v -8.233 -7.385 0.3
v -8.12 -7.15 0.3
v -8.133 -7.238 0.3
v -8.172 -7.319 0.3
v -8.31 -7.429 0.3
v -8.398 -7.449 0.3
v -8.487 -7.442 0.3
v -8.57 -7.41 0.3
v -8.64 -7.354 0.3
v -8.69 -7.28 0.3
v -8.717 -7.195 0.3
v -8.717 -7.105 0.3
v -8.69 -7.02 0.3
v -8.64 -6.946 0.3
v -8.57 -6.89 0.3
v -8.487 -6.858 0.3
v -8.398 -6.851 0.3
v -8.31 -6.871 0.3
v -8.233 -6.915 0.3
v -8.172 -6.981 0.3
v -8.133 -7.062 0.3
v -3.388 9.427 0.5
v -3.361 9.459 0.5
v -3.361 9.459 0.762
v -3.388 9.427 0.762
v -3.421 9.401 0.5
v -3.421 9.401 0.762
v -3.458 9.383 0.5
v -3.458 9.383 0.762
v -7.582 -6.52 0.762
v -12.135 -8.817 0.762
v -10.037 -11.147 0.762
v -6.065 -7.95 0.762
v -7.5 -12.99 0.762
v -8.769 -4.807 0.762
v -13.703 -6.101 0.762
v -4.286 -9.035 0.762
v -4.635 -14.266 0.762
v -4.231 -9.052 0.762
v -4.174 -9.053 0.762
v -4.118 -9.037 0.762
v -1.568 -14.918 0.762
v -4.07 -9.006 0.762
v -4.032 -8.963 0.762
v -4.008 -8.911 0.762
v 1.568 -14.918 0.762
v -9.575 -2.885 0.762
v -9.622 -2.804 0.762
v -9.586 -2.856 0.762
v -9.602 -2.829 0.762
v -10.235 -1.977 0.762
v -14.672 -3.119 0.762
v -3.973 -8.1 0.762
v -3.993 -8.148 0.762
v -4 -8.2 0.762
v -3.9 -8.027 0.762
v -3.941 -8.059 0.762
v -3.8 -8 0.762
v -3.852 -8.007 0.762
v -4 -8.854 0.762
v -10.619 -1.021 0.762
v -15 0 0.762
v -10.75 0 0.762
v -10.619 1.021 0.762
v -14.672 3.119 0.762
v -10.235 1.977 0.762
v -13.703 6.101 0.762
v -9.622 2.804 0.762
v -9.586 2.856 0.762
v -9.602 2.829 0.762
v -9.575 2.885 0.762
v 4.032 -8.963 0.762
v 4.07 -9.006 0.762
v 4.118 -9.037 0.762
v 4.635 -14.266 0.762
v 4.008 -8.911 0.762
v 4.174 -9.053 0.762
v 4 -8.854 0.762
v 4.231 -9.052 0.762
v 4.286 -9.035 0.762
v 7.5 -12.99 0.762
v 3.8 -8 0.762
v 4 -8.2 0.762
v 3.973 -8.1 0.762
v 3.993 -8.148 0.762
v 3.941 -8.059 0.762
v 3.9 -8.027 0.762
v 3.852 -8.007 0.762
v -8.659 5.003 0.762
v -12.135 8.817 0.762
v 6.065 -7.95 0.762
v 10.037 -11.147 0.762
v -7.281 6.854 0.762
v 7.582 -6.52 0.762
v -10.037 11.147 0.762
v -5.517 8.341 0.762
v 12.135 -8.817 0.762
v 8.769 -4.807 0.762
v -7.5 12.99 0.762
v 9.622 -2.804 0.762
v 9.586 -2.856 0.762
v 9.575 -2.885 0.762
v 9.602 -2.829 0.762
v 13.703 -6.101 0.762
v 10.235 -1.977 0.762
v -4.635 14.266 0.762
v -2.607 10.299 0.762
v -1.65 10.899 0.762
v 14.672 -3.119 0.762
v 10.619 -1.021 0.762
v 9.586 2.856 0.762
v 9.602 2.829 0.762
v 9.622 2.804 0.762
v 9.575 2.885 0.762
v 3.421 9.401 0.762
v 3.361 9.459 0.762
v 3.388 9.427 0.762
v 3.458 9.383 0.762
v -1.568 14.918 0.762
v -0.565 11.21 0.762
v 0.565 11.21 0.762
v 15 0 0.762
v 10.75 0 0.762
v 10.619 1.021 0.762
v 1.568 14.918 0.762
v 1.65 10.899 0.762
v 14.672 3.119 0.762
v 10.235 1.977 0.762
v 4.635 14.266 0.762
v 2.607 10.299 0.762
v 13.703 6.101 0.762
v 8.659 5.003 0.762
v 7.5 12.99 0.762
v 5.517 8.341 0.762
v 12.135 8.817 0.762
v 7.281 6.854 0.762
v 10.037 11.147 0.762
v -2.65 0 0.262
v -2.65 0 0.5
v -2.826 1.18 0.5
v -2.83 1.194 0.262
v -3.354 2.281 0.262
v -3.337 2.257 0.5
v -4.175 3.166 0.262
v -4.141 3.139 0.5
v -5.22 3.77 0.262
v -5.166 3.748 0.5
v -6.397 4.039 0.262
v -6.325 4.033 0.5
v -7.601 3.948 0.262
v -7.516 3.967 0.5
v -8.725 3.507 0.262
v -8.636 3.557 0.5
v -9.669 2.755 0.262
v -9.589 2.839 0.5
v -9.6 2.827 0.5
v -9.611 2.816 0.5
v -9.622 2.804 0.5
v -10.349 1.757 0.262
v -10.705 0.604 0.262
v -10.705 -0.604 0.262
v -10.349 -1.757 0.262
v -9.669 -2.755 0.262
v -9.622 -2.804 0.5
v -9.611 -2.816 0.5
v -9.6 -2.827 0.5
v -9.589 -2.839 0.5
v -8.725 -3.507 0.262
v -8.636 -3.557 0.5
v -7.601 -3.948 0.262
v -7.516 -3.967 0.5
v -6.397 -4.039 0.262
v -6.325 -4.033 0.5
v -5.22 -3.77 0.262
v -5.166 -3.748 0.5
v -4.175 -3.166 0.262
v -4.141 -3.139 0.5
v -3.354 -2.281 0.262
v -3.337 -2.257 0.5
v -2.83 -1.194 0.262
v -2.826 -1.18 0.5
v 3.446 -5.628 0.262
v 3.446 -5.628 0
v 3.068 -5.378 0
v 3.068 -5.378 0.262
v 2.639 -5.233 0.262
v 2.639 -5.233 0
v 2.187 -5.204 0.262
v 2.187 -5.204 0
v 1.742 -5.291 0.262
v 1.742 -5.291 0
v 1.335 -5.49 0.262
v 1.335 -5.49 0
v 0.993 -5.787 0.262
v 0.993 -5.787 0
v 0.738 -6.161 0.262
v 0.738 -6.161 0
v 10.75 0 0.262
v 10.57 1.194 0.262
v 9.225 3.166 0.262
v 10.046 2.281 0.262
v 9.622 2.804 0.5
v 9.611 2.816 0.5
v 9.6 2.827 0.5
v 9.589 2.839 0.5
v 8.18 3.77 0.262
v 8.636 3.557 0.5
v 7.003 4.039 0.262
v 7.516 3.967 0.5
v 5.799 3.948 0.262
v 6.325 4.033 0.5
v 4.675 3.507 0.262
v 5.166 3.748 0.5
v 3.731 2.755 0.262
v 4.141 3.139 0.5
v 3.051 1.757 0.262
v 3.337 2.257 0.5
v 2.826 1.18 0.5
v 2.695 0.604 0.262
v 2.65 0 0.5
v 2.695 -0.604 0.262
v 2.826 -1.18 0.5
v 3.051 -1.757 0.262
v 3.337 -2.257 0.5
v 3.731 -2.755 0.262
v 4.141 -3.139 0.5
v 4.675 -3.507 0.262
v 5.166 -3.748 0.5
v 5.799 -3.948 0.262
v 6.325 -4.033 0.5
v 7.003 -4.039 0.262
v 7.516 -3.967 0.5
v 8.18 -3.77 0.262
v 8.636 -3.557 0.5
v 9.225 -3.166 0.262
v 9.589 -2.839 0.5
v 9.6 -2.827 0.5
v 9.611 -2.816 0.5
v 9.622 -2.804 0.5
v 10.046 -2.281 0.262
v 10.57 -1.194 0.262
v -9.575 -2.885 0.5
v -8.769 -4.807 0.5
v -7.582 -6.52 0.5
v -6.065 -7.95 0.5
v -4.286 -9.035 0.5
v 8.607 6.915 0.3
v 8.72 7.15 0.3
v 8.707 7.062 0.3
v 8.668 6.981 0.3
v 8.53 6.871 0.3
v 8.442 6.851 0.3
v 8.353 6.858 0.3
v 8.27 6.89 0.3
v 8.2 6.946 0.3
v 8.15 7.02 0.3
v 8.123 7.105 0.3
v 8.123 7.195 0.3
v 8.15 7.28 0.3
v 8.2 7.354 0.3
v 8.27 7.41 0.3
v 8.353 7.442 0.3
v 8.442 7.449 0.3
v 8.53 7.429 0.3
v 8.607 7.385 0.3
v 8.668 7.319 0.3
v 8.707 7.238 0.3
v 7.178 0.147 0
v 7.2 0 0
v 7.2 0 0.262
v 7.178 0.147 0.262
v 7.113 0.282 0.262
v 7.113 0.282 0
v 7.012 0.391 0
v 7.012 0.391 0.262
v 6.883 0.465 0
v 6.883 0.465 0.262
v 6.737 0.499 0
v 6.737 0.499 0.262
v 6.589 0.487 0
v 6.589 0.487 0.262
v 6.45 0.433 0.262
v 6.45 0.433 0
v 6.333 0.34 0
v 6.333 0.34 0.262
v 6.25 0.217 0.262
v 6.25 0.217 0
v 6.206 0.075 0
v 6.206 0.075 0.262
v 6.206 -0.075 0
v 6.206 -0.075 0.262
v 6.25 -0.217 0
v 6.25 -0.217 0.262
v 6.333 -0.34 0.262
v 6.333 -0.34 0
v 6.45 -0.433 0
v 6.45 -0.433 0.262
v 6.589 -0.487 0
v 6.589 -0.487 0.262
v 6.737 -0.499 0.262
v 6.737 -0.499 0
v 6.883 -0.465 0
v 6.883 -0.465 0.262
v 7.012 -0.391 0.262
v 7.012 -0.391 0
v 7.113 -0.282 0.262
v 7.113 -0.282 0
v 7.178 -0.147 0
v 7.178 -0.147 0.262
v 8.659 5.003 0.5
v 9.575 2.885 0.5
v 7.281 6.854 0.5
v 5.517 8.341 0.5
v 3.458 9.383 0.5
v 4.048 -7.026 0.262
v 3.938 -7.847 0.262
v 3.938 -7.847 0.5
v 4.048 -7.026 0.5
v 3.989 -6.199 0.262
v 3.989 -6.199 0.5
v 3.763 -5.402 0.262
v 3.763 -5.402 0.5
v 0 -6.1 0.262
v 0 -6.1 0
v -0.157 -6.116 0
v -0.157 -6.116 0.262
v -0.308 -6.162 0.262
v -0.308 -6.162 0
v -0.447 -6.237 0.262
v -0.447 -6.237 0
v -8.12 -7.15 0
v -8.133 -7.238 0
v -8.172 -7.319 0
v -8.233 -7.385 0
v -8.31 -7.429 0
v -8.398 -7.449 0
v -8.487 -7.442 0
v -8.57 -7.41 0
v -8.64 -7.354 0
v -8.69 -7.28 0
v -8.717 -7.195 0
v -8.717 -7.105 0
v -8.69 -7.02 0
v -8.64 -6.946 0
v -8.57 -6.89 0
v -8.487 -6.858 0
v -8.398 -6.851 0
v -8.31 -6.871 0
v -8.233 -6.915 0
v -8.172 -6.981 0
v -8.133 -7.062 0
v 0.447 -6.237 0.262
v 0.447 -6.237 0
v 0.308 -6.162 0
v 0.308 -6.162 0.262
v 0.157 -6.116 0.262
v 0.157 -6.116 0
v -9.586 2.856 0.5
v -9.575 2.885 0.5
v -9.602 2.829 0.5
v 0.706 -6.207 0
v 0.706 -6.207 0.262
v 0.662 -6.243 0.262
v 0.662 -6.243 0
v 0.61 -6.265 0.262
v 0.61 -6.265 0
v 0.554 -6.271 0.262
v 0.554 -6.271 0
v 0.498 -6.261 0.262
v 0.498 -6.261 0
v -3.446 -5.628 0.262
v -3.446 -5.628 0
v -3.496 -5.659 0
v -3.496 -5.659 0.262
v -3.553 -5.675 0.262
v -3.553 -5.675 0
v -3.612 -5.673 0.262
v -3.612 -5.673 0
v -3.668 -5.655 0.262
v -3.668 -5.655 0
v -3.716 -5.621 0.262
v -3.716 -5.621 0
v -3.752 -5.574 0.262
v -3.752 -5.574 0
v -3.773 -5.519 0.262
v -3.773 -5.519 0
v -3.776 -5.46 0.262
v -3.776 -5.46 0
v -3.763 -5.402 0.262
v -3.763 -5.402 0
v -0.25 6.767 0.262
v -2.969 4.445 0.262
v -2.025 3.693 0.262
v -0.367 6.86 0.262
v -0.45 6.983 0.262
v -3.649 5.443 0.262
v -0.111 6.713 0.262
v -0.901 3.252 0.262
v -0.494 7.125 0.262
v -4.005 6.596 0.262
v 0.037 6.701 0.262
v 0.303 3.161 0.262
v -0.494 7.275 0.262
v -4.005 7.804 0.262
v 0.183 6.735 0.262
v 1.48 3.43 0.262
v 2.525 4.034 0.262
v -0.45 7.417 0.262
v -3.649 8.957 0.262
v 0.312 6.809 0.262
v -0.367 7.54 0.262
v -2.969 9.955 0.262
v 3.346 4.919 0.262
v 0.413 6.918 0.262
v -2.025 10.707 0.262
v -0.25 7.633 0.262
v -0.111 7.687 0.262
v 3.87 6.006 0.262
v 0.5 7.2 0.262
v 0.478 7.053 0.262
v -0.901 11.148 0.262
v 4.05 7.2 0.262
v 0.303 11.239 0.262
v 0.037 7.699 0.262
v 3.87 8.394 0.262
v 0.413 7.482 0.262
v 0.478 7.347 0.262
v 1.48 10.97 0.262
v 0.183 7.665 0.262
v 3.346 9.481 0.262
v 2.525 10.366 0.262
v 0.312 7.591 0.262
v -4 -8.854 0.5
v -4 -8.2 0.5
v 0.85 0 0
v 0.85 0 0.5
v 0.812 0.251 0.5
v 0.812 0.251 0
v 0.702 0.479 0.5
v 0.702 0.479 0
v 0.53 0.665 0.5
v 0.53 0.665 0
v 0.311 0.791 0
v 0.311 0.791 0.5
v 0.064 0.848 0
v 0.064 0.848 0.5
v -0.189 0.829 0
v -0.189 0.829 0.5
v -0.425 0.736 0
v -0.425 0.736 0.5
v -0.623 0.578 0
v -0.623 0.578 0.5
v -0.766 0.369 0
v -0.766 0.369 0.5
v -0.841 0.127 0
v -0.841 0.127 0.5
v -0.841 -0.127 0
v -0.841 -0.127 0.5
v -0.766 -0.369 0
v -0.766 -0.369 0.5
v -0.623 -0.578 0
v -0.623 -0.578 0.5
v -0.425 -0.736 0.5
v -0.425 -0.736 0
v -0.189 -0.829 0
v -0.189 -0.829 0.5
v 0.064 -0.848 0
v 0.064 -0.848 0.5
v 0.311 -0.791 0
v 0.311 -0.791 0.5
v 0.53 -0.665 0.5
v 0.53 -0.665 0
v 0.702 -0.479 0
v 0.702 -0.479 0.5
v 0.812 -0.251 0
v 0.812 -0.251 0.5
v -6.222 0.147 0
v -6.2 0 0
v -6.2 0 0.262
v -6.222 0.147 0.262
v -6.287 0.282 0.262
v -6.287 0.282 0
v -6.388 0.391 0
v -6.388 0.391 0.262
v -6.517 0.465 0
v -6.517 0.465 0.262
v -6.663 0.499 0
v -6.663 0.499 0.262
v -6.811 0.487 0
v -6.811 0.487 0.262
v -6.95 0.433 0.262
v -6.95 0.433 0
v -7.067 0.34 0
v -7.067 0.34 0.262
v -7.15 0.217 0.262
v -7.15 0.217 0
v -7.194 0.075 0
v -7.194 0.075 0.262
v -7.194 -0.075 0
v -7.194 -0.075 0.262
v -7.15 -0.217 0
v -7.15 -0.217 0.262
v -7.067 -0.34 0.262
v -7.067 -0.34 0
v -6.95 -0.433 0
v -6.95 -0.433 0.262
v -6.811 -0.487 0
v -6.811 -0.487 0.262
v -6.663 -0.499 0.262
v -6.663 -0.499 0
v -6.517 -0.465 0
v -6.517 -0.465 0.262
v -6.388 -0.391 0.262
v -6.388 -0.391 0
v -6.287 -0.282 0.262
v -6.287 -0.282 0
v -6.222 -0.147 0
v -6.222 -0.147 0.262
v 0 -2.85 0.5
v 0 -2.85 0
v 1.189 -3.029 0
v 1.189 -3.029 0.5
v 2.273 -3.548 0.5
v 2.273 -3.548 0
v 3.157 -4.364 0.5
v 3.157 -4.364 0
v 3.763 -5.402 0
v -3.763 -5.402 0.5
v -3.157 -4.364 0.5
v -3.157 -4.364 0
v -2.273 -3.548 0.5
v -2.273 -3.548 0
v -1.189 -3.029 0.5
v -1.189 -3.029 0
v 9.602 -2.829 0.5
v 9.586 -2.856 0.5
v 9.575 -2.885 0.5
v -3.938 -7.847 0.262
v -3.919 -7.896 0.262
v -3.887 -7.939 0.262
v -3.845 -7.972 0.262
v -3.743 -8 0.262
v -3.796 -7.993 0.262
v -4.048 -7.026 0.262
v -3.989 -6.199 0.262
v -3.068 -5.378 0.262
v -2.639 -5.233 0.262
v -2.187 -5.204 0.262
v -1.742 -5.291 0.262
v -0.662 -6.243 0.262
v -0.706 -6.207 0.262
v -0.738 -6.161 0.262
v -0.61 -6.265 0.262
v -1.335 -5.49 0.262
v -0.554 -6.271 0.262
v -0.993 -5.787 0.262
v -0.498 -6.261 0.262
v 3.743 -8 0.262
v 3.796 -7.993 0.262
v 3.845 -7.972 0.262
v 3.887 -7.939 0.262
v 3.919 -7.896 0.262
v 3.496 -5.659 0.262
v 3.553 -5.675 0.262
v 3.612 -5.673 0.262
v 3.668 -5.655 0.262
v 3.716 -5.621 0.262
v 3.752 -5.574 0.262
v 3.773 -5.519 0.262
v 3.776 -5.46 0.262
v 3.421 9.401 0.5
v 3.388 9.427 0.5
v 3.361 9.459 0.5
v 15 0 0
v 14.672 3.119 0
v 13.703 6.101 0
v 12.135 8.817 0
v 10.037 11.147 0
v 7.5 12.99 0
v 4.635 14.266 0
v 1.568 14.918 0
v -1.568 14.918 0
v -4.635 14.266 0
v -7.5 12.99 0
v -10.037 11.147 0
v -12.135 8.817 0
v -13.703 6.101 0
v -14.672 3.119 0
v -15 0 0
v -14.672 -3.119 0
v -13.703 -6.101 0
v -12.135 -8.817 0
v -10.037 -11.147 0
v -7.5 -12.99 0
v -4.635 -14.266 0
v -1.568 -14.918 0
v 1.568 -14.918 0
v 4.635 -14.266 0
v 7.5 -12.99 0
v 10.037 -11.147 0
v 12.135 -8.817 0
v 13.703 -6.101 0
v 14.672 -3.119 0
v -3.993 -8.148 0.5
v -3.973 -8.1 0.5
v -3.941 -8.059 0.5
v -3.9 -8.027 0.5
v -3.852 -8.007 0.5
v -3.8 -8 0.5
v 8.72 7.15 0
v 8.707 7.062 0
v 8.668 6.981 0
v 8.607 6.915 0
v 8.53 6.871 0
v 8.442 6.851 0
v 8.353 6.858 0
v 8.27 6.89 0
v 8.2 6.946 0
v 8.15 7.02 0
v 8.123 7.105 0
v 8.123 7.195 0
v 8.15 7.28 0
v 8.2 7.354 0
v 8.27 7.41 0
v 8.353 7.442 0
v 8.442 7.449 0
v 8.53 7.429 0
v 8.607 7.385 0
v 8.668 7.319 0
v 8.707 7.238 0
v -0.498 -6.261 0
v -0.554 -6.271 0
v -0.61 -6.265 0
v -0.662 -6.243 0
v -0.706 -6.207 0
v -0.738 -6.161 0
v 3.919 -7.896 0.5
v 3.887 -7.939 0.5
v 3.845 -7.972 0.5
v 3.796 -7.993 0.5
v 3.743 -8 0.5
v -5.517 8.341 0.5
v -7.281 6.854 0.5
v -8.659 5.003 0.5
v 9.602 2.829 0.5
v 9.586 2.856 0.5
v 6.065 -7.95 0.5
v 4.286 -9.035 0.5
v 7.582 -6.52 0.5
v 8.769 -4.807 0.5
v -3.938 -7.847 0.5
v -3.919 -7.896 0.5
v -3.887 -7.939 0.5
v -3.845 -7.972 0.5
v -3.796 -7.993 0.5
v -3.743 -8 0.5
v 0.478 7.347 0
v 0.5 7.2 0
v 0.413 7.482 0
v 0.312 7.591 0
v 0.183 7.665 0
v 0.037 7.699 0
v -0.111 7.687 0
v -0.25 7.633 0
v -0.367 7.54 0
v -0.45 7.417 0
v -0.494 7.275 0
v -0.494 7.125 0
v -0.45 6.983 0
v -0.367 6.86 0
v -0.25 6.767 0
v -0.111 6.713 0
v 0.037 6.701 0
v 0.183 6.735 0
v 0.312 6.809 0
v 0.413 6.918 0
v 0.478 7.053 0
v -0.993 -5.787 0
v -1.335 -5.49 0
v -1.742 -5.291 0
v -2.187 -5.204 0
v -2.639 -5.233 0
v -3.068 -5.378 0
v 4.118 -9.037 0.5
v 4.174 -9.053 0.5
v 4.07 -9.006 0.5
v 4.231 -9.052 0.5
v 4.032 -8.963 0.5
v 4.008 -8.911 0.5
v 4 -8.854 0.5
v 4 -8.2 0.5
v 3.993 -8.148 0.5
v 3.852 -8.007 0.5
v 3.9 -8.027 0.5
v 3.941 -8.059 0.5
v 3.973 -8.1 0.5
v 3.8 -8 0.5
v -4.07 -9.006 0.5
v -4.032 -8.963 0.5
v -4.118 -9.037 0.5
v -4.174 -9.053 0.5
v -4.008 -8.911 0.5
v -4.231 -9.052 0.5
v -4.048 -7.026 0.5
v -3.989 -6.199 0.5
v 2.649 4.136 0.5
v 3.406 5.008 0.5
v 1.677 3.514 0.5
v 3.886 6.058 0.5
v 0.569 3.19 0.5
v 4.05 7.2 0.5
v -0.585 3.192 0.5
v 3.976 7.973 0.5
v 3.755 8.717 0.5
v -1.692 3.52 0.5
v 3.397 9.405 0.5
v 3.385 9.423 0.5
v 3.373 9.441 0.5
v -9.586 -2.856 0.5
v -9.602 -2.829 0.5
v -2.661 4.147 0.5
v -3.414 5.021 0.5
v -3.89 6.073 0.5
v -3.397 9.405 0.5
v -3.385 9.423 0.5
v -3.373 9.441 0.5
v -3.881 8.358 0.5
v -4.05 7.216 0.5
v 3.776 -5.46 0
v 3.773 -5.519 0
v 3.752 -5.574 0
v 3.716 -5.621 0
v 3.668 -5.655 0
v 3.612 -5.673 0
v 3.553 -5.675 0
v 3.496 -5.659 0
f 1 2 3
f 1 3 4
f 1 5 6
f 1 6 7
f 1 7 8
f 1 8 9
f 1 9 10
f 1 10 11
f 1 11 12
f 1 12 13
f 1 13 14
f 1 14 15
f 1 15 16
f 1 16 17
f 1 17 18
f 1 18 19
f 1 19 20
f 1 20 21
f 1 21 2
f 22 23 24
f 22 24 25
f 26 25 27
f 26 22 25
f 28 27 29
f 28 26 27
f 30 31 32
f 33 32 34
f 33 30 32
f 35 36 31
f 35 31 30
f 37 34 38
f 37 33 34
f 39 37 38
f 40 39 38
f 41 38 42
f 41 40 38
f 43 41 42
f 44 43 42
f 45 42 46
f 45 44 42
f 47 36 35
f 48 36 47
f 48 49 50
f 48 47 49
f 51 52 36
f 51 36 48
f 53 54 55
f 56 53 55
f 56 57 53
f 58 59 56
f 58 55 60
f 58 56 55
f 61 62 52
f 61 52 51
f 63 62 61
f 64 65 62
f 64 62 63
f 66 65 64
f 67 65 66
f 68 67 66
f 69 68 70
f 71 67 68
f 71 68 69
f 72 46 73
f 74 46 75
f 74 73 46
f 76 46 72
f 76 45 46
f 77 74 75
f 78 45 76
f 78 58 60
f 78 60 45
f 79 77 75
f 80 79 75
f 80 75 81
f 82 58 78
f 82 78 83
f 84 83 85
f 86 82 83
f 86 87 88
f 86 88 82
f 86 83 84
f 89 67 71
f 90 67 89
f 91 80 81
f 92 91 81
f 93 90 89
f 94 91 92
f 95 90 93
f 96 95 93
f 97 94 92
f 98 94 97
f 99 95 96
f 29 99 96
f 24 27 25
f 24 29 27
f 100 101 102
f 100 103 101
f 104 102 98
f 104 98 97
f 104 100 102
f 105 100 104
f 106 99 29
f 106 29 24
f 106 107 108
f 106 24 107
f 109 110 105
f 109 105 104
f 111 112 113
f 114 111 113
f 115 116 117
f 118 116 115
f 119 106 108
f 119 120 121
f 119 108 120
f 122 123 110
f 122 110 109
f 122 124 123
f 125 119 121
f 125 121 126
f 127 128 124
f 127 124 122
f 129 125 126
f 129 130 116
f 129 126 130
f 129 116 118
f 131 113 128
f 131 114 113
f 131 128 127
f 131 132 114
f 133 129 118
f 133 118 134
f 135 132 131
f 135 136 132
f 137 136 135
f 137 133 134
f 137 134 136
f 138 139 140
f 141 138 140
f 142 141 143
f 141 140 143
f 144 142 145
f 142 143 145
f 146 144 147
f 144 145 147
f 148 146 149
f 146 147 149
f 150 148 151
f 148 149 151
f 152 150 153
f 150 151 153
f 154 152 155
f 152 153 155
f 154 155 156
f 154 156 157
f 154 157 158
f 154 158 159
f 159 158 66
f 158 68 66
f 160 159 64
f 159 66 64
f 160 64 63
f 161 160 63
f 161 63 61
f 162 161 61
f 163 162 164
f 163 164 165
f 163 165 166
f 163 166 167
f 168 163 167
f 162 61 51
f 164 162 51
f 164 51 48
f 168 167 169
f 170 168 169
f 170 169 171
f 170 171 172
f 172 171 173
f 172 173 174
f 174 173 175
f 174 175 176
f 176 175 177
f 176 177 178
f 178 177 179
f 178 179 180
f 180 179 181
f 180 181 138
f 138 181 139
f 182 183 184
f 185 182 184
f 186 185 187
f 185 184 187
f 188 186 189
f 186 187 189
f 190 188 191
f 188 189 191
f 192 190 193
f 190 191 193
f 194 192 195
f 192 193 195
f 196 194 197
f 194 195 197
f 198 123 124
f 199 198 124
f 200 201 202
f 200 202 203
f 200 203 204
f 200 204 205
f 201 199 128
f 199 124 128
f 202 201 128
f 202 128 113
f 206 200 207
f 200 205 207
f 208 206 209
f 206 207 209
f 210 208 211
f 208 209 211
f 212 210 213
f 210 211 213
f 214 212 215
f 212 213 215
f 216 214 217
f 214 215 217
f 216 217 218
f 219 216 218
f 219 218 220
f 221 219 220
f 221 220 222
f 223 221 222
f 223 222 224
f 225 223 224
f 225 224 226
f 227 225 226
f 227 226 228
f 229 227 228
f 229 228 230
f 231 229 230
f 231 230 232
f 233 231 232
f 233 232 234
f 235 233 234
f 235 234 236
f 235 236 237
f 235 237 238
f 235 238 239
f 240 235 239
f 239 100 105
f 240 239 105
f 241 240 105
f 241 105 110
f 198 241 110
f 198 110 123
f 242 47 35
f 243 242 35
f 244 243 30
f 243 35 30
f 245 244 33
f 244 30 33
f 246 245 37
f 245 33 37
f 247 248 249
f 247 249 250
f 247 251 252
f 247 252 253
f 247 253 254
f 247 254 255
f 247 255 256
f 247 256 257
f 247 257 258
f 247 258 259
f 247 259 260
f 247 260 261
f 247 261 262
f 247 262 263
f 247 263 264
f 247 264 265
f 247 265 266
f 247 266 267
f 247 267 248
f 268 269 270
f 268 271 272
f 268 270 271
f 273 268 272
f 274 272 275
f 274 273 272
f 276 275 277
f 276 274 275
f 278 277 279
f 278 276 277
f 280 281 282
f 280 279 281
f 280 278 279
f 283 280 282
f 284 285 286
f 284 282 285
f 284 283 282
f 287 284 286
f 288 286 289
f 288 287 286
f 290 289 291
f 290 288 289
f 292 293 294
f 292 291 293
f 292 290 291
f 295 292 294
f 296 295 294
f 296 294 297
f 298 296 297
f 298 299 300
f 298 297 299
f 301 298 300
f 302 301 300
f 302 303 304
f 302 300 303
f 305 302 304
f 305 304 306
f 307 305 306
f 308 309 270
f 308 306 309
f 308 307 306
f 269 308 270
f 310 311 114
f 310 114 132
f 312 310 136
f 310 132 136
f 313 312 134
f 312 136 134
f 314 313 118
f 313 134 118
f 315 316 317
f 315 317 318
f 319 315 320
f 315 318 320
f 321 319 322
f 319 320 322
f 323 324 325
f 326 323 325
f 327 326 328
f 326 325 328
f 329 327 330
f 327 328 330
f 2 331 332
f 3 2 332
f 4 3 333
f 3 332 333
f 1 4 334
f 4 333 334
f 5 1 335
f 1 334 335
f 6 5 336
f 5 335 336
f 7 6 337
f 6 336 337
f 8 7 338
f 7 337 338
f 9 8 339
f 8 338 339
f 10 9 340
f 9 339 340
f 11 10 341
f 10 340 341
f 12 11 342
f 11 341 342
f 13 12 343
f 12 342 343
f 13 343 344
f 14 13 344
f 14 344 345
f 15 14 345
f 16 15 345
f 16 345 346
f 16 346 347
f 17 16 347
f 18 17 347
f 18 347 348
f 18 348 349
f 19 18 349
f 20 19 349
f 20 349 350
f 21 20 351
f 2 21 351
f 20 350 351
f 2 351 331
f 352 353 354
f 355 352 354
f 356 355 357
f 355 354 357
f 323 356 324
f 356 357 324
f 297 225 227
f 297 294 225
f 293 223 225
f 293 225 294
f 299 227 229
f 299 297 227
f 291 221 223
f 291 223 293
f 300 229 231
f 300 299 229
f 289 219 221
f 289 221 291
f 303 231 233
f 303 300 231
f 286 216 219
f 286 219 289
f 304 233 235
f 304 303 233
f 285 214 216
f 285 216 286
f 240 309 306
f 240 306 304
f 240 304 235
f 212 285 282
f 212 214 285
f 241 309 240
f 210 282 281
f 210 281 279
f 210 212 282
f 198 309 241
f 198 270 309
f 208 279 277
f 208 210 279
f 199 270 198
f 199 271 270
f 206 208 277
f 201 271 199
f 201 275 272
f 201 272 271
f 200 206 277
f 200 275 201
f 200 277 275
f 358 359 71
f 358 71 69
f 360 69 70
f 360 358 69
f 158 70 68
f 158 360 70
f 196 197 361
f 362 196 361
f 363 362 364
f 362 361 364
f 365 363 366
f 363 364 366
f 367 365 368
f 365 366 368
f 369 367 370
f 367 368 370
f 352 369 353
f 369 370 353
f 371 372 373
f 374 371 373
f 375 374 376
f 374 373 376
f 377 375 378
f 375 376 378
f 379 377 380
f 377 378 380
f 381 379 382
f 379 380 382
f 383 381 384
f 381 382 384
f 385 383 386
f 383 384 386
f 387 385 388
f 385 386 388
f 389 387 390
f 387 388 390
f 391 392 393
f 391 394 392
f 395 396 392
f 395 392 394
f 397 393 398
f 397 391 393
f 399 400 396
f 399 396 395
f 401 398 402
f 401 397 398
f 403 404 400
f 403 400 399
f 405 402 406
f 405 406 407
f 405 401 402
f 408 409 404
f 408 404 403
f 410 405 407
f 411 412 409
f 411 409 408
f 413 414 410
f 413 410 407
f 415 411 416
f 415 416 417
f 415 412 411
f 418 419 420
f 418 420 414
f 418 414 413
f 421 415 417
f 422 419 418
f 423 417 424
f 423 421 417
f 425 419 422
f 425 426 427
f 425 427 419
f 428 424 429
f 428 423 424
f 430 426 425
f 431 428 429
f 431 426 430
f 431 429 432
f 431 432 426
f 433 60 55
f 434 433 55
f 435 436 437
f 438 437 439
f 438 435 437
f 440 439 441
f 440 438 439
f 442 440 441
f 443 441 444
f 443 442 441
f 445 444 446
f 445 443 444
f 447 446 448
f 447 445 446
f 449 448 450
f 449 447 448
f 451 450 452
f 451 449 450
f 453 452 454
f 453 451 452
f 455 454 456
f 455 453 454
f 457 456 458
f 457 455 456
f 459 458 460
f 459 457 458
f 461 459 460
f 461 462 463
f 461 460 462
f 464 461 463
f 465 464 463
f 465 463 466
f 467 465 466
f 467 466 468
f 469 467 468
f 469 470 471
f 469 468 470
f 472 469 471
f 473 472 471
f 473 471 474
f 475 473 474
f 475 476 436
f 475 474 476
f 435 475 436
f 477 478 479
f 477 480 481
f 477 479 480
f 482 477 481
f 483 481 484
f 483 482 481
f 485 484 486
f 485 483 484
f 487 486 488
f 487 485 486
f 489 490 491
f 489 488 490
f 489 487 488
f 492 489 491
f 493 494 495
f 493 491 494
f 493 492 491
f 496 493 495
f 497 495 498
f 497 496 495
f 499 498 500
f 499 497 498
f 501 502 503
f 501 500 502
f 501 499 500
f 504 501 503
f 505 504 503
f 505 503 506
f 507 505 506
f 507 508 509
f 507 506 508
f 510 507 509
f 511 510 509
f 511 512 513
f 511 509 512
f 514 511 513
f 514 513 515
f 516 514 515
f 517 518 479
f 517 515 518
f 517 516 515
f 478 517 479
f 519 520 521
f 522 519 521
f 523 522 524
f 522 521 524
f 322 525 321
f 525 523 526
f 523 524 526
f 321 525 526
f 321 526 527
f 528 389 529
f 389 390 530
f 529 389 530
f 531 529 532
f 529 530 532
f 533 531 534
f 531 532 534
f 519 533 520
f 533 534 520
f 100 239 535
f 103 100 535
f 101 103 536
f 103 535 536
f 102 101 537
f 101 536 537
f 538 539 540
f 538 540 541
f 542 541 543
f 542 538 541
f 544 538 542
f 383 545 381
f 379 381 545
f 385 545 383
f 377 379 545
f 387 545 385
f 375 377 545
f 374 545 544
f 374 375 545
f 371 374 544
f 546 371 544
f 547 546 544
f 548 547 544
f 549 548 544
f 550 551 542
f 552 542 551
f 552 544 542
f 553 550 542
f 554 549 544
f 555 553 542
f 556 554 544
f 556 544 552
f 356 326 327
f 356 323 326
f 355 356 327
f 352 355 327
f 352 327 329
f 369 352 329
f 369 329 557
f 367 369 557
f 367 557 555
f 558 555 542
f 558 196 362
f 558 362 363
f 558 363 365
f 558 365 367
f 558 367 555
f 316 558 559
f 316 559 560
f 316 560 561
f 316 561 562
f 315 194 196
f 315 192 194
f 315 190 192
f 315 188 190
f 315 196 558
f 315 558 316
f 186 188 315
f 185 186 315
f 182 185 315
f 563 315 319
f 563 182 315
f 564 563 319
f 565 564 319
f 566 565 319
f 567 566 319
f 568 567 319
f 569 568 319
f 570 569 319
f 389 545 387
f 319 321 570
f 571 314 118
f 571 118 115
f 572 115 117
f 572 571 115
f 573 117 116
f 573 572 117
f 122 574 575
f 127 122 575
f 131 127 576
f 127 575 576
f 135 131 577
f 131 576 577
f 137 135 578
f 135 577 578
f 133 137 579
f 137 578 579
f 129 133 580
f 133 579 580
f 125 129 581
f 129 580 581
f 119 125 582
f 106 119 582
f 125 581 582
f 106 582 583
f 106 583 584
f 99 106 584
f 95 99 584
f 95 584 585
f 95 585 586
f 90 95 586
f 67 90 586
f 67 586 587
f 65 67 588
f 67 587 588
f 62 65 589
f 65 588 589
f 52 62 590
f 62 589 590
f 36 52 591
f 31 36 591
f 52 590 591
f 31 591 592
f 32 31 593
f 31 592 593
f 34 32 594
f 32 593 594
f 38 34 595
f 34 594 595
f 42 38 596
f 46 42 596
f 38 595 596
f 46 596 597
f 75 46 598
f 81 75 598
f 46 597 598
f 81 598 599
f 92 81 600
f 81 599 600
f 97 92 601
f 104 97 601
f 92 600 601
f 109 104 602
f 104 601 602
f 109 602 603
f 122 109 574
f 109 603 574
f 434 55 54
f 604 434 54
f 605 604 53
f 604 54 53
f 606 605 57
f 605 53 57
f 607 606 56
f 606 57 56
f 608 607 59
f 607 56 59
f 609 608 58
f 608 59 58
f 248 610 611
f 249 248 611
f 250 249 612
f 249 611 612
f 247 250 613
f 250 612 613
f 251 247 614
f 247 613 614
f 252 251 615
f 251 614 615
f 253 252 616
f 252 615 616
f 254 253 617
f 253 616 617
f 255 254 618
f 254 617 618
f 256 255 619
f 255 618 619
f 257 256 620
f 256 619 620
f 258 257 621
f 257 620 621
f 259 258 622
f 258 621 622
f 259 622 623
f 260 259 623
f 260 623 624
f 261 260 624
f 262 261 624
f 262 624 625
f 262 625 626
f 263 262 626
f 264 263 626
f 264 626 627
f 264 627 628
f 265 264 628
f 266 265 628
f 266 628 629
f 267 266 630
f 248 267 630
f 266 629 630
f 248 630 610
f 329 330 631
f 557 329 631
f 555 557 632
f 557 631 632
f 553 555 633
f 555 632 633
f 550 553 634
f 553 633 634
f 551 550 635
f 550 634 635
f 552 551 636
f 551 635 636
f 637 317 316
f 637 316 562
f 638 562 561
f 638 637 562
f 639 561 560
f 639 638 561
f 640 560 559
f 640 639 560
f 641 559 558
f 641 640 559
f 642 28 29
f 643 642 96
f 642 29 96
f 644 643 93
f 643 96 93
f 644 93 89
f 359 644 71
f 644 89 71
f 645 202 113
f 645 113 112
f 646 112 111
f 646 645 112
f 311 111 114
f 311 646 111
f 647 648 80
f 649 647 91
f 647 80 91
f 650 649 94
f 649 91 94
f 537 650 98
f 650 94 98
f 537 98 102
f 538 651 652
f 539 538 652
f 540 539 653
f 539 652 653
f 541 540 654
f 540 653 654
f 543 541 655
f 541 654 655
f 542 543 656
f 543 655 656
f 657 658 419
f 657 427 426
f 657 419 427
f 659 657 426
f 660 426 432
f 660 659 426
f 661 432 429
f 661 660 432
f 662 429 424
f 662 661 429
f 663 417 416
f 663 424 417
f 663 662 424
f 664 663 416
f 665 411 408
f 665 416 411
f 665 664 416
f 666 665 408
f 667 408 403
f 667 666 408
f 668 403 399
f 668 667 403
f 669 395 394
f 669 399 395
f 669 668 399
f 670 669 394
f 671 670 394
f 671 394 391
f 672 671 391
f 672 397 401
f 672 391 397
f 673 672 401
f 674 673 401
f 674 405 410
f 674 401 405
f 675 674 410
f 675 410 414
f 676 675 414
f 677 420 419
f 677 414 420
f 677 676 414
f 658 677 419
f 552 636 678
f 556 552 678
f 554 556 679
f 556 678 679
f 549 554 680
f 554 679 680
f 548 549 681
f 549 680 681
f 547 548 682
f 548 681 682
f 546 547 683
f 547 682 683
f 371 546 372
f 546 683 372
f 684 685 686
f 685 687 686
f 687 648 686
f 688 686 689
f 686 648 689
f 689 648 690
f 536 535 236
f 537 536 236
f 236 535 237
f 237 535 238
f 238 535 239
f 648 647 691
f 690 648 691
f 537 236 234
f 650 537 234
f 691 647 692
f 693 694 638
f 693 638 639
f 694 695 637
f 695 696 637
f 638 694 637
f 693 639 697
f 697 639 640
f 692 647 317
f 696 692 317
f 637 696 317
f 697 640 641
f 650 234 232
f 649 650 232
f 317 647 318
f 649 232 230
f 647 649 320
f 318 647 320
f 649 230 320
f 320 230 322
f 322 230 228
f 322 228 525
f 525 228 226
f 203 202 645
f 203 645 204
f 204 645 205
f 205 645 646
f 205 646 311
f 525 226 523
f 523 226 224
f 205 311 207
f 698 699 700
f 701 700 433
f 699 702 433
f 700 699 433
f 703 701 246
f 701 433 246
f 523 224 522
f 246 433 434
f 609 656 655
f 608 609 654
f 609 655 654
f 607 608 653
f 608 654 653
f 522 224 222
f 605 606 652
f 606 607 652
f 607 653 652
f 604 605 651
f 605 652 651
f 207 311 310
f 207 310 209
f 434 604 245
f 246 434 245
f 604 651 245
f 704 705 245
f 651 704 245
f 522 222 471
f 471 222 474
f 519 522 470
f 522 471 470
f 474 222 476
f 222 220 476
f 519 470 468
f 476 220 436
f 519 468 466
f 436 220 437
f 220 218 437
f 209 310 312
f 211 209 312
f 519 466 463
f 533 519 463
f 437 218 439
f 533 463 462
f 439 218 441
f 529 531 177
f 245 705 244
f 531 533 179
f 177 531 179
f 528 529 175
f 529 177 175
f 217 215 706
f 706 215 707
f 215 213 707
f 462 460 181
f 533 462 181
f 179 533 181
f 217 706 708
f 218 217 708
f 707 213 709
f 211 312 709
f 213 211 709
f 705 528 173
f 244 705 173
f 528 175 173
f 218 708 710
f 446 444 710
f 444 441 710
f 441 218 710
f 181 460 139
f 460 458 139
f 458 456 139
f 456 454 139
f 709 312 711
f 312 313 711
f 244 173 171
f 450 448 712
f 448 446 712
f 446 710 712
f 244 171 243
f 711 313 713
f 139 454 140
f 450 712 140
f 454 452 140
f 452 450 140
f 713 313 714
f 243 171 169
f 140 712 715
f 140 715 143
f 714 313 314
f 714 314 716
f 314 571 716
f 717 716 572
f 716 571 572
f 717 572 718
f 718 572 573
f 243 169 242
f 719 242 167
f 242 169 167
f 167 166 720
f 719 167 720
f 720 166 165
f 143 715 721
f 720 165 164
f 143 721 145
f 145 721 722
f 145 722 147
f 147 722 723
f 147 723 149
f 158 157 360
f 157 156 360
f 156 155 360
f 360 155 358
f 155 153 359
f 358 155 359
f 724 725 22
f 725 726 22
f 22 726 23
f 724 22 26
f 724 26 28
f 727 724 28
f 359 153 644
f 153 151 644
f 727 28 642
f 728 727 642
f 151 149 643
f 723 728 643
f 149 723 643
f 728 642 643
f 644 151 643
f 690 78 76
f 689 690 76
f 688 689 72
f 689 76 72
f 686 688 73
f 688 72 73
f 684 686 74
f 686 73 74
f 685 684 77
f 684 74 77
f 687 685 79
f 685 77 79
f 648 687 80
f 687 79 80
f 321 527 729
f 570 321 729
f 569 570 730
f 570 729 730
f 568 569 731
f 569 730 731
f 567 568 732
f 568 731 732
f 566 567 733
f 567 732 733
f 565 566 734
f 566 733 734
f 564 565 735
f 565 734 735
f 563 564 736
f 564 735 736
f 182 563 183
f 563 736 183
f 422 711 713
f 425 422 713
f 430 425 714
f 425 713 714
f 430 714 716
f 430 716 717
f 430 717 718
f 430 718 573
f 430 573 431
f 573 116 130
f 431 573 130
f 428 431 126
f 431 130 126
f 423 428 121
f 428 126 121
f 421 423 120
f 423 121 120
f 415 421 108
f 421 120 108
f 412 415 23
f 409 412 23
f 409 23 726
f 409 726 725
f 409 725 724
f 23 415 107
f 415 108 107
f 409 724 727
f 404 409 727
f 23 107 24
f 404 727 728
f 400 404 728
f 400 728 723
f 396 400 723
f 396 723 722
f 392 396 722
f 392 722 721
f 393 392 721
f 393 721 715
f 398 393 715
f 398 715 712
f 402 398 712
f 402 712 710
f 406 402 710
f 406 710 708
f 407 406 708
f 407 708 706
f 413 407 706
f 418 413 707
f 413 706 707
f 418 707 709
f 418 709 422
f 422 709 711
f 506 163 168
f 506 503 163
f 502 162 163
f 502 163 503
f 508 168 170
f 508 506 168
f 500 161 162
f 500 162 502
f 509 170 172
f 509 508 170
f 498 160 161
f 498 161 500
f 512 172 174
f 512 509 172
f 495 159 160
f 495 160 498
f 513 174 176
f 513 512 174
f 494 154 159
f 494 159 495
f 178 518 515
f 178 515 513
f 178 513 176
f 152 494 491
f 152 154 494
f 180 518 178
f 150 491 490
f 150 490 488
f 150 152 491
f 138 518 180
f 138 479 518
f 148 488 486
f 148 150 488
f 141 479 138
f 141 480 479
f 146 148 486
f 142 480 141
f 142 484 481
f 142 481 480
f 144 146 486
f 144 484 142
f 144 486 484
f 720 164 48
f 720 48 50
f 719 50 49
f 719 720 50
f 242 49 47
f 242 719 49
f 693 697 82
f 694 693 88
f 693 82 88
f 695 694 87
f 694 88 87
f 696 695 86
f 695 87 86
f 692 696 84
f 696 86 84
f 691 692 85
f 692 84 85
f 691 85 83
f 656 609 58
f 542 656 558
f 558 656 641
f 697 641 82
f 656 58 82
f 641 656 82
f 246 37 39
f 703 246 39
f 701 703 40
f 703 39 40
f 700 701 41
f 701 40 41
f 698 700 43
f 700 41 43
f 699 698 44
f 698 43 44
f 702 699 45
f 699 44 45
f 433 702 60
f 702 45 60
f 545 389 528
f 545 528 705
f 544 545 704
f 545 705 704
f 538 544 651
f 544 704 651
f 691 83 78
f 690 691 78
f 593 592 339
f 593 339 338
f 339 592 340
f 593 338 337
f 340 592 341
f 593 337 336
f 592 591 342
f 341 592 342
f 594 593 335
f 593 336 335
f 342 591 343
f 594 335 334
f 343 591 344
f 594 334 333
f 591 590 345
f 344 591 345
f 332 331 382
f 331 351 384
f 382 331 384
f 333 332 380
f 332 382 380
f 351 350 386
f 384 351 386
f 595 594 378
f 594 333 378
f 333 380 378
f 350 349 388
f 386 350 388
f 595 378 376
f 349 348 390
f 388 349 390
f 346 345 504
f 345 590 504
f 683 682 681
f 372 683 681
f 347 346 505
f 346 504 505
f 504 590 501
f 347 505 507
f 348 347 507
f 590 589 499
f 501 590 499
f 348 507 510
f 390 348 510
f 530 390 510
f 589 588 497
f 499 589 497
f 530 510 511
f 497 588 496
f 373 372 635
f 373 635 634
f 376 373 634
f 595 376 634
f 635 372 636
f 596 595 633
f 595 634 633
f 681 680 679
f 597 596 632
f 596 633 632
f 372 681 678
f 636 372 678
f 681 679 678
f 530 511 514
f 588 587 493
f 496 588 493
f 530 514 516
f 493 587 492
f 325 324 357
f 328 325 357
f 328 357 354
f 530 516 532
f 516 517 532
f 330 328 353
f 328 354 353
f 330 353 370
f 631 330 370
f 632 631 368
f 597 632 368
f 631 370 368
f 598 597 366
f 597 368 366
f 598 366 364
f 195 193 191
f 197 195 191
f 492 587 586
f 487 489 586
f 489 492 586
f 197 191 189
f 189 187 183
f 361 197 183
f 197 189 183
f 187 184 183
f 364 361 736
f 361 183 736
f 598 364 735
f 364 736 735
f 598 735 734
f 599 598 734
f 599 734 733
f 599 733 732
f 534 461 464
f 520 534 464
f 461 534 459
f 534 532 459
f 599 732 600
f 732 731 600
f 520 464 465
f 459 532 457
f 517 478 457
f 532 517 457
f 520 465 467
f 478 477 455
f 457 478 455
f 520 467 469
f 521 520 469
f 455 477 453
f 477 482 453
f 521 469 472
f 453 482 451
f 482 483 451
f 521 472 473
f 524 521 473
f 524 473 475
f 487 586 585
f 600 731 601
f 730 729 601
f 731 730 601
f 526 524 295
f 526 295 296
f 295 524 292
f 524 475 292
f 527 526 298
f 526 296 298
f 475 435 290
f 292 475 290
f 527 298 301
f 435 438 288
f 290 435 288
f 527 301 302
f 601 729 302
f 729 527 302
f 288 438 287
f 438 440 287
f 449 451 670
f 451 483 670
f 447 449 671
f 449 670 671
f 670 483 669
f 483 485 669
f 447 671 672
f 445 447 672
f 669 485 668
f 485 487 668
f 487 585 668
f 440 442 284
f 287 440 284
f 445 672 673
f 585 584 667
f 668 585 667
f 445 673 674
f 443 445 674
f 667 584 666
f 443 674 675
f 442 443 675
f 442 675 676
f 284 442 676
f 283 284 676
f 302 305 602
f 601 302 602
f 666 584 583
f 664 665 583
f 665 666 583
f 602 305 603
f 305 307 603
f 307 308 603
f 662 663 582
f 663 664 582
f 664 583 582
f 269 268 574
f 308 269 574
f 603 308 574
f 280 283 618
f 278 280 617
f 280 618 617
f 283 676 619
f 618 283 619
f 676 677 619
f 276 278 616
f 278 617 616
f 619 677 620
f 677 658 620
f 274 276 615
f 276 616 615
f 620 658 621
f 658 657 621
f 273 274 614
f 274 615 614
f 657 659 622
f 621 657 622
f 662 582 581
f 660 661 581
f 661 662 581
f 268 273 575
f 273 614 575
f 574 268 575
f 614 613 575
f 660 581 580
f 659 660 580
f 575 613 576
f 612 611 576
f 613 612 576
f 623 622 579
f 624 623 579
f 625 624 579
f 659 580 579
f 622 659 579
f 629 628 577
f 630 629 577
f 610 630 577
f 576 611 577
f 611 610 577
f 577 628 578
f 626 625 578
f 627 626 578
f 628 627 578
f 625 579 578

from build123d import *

# Parameters (mm, degrees)
F0_R         = 15
F0_R_2       = 0.5
F0_R_3       = 0.85
F1_DEPTH     = 0.762
F3_DEPTH     = 0.262
F4_R         = 4.05
F5_DEPTH     = 0.5
F6_T4_DEPTH  = 0.6914880487
F6_T9_DEPTH  = 0.6914880487
F6_T11_DEPTH = 0.3832692911
F6_T13_DEPTH = 0.4252513356
F7_R         = 0.3
F8_DEPTH     = 0.3


# Not quite as in the source:
# - a fillet or chamfer that OpenCascade refuses, or shapes differently, is made with other operations: its cross-section is extruded or revolved along the edge and cut away or added


with BuildPart() as f1:
    # F0 (on Top) → F1 (new body)
    with BuildSketch(Plane.XY):
        Circle(F0_R)
        with BuildLine():
            ThreePointArc((-3.7629684096, -5.4024791326), (-2.2734929609, -3.548324336), (0, -2.85))
            ThreePointArc((0, -2.85), (2.2734929609, -3.548324336), (3.7629684096, -5.4024791326))
            ThreePointArc((3.7629684096, -5.4024791326), (3.6929780242, -5.6394712752), (3.4461538031, -5.6275660849))
            ThreePointArc((3.4461538031, -5.6275660849), (1.9616904878, -5.2330123256), (0.7378557396, -6.1612000827))
            ThreePointArc((0.7378557396, -6.1612000827), (0.6097380289, -6.2645935657), (0.4474599736, -6.2368412165))
            ThreePointArc((0.4474599736, -6.2368412165), (0.233958301, -6.1349748283), (0, -6.1))
            ThreePointArc((0, -6.1), (-0.233958301, -6.1349748283), (-0.4474599736, -6.2368412165))
            ThreePointArc((-0.4474599736, -6.2368412165), (-0.6097380289, -6.2645935657), (-0.7378557396, -6.1612000827))
            ThreePointArc((-0.7378557396, -6.1612000827), (-1.9616904878, -5.2330123256), (-3.4461538031, -5.6275660849))
            ThreePointArc((-3.4461538031, -5.6275660849), (-3.6929780242, -5.6394712752), (-3.7629684096, -5.4024791326))
        make_face(mode=Mode.SUBTRACT)
        with Locations((-6.7, 0)):
            Circle(F0_R_2, mode=Mode.SUBTRACT)
        Circle(F0_R_3, mode=Mode.SUBTRACT)
        with Locations((6.7, 0)):
            Circle(F0_R_2, mode=Mode.SUBTRACT)
        with Locations((0, 7.2)):
            Circle(F0_R_2, mode=Mode.SUBTRACT)
    extrude(amount=F1_DEPTH)

    # F2 (on face) → F3 (cut)
    with BuildSketch(Plane.XY.offset(0.762)):
        with BuildLine():
            ThreePointArc((4, -8.8543774485), (4.0930955032, -9.0234082994), (4.2857142857, -9.0350790291))
            ThreePointArc((4.2857142857, -9.0350790291), (0, 10), (-4.2857142857, -9.0350790291))
            ThreePointArc((-4.2857142857, -9.0350790291), (-4.0930955032, -9.0234082994), (-4, -8.8543774485))
            Line((-4, -8.8543774485), (-4, -8.2))
            ThreePointArc((-4, -8.2), (-3.9414213562, -8.0585786438), (-3.8, -8))
            Line((-3.8, -8), (0, -8))
            Line((0, -8), (3.8, -8))
            ThreePointArc((3.8, -8), (3.9414213562, -8.0585786438), (4, -8.2))
            Line((4, -8.2), (4, -8.8543774485))
        make_face()
    extrude(amount=-F3_DEPTH, mode=Mode.SUBTRACT)

    # F4 (on face) → F5 (cut)
    with BuildSketch(Plane.XY.offset(0.762)):
        with Locations((0, 7.2)):
            Circle(F4_R)
        with Locations((6.7, 0)):
            Circle(F4_R)
        with Locations((-6.7, 0)):
            Circle(F4_R)
        with BuildLine():
            ThreePointArc((3.8, -8), (3.8470411203, -8.0056108722), (3.8914428234, -8.02212867))
            ThreePointArc((3.8914428234, -8.02212867), (0, -2.85), (-3.8914428234, -8.02212867))
            ThreePointArc((-3.8914428234, -8.02212867), (-3.8470411203, -8.0056108722), (-3.8, -8))
            Line((-3.8, -8), (3.8, -8))
        make_face()
    extrude(amount=-F5_DEPTH, mode=Mode.SUBTRACT)

    # F6: fillet of radius 0.2 on 8 edges, made by hand


with BuildPart() as f6_tool2:
    # F6_s3 → F6_t4 (new body)
    with BuildSketch(Plane.XY.offset(0.5)):
        with BuildLine():
            ThreePointArc((3.9377859629, -7.8467532468), (3.8671202695, -7.9570838142), (3.7433273968, -8))
            Line((3.7433273968, -8), (3.7433273968, -8.02))
            ThreePointArc((3.7433273968, -8.02), (3.8, -8.02), (3.8822985411, -8.039915803))
            Line((3.8822985411, -8.039915803), (3.910659825, -8.0276700461))
            ThreePointArc((3.910659825, -8.0276700461), (3.9349326547, -7.9398100803), (3.9572318195, -7.8514285714))
            Line((3.9572318195, -7.8514285714), (3.9377859629, -7.8467532468))
        make_face()
    extrude(amount=-F6_T4_DEPTH)

    split(bisect_by=Plane.XY, keep=Keep.TOP)


with BuildPart() as f1_1:
    add(f1.part)

    # F6_t1: union F6_tool2
    add(f6_tool2.part)


with BuildPart() as f6_tool7:
    # F6_s8 → F6_t9 (new body)
    with BuildSketch(Plane.XY.offset(0.5)):
        with BuildLine():
            ThreePointArc((-3.9377859629, -7.8467532468), (-3.8671202695, -7.9570838142), (-3.7433273968, -8))
            Line((-3.7433273968, -8), (-3.7433273968, -8.02))
            ThreePointArc((-3.7433273968, -8.02), (-3.8, -8.02), (-3.8822985411, -8.039915803))
            Line((-3.8822985411, -8.039915803), (-3.910659825, -8.0276700461))
            ThreePointArc((-3.910659825, -8.0276700461), (-3.9349326547, -7.9398100803), (-3.9572318195, -7.8514285714))
            Line((-3.9572318195, -7.8514285714), (-3.9377859629, -7.8467532468))
        make_face()
    extrude(amount=-F6_T9_DEPTH)

    split(bisect_by=Plane.XY, keep=Keep.TOP)


with BuildPart() as f1_2:
    add(f1_1.part)

    # F6_t6: union F6_tool7
    add(f6_tool7.part)

    # F6_s12 → F6_t11 (cut)
    with BuildSketch(Plane.XY.offset(0.5)):
        with BuildLine():
            ThreePointArc((-9.5747366111, 2.8852068953), (-9.5935467273, 2.8420149313), (-9.6219381036, 2.8044211022))
            ThreePointArc((-9.6219381036, 2.8044211022), (-9.6053293925, 2.8216238447), (-9.588619403, 2.8387282266))
            ThreePointArc((-9.588619403, 2.8387282266), (-9.5817061892, 2.8619759788), (-9.5747366111, 2.8852068953))
        make_face()
        with BuildLine():
            ThreePointArc((-9.6219381036, -2.8044211022), (-9.5935467273, -2.8420149313), (-9.5747366111, -2.8852068953))
            ThreePointArc((-9.5747366111, -2.8852068953), (-9.5817061892, -2.8619759788), (-9.588619403, -2.8387282266))
            ThreePointArc((-9.588619403, -2.8387282266), (-9.6053293925, -2.8216238447), (-9.6219381036, -2.8044211022))
        make_face()
        with BuildLine():
            ThreePointArc((9.6219381036, 2.8044211022), (9.5935467273, 2.8420149313), (9.5747366111, 2.8852068953))
            ThreePointArc((9.5747366111, 2.8852068953), (9.5817061892, 2.8619759788), (9.588619403, 2.8387282266))
            ThreePointArc((9.588619403, 2.8387282266), (9.6053293925, 2.8216238447), (9.6219381036, 2.8044211022))
        make_face()
        with BuildLine():
            ThreePointArc((9.6219381036, -2.8044211022), (9.5935467273, -2.8420149313), (9.5747366111, -2.8852068953))
            ThreePointArc((9.5747366111, -2.8852068953), (9.5817061892, -2.8619759788), (9.588619403, -2.8387282266))
            ThreePointArc((9.588619403, -2.8387282266), (9.6053293925, -2.8216238447), (9.6219381036, -2.8044211022))
        make_face()
    extrude(amount=F6_T11_DEPTH, mode=Mode.SUBTRACT)

    # F6_s14 → F6_t13 (cut)
    with BuildSketch(Plane.XY.offset(0.5)):
        with BuildLine():
            ThreePointArc((3.4582244159, 9.3829997277), (3.4038059187, 9.4134107296), (3.3613941322, 9.4590992647))
            ThreePointArc((3.3613941322, 9.4590992647), (3.3792435663, 9.4323111163), (3.3968795208, 9.4053819444))
            ThreePointArc((3.3968795208, 9.4053819444), (3.427570238, 9.3942409094), (3.4582244159, 9.3829997277))
        make_face()
        with BuildLine():
            ThreePointArc((-3.3613941322, 9.4590992647), (-3.4038059187, 9.4134107296), (-3.4582244159, 9.3829997277))
            ThreePointArc((-3.4582244159, 9.3829997277), (-3.427570238, 9.3942409094), (-3.3968795208, 9.4053819444))
            ThreePointArc((-3.3968795208, 9.4053819444), (-3.3792435663, 9.4323111163), (-3.3613941322, 9.4590992647))
        make_face()
    extrude(amount=F6_T13_DEPTH, mode=Mode.SUBTRACT)

    # F7 (on face) → F8 (cut)
    with BuildSketch(Plane(origin=(0, 0, 0), x_dir=(1, 0, 0), z_dir=(0, 0, -1))):
        with Locations((8.42, -7.15)):
            Circle(F7_R)
        with Locations((-8.42, 7.15)):
            Circle(F7_R)
    extrude(amount=-F8_DEPTH, mode=Mode.SUBTRACT)


solid = f1_2.part
